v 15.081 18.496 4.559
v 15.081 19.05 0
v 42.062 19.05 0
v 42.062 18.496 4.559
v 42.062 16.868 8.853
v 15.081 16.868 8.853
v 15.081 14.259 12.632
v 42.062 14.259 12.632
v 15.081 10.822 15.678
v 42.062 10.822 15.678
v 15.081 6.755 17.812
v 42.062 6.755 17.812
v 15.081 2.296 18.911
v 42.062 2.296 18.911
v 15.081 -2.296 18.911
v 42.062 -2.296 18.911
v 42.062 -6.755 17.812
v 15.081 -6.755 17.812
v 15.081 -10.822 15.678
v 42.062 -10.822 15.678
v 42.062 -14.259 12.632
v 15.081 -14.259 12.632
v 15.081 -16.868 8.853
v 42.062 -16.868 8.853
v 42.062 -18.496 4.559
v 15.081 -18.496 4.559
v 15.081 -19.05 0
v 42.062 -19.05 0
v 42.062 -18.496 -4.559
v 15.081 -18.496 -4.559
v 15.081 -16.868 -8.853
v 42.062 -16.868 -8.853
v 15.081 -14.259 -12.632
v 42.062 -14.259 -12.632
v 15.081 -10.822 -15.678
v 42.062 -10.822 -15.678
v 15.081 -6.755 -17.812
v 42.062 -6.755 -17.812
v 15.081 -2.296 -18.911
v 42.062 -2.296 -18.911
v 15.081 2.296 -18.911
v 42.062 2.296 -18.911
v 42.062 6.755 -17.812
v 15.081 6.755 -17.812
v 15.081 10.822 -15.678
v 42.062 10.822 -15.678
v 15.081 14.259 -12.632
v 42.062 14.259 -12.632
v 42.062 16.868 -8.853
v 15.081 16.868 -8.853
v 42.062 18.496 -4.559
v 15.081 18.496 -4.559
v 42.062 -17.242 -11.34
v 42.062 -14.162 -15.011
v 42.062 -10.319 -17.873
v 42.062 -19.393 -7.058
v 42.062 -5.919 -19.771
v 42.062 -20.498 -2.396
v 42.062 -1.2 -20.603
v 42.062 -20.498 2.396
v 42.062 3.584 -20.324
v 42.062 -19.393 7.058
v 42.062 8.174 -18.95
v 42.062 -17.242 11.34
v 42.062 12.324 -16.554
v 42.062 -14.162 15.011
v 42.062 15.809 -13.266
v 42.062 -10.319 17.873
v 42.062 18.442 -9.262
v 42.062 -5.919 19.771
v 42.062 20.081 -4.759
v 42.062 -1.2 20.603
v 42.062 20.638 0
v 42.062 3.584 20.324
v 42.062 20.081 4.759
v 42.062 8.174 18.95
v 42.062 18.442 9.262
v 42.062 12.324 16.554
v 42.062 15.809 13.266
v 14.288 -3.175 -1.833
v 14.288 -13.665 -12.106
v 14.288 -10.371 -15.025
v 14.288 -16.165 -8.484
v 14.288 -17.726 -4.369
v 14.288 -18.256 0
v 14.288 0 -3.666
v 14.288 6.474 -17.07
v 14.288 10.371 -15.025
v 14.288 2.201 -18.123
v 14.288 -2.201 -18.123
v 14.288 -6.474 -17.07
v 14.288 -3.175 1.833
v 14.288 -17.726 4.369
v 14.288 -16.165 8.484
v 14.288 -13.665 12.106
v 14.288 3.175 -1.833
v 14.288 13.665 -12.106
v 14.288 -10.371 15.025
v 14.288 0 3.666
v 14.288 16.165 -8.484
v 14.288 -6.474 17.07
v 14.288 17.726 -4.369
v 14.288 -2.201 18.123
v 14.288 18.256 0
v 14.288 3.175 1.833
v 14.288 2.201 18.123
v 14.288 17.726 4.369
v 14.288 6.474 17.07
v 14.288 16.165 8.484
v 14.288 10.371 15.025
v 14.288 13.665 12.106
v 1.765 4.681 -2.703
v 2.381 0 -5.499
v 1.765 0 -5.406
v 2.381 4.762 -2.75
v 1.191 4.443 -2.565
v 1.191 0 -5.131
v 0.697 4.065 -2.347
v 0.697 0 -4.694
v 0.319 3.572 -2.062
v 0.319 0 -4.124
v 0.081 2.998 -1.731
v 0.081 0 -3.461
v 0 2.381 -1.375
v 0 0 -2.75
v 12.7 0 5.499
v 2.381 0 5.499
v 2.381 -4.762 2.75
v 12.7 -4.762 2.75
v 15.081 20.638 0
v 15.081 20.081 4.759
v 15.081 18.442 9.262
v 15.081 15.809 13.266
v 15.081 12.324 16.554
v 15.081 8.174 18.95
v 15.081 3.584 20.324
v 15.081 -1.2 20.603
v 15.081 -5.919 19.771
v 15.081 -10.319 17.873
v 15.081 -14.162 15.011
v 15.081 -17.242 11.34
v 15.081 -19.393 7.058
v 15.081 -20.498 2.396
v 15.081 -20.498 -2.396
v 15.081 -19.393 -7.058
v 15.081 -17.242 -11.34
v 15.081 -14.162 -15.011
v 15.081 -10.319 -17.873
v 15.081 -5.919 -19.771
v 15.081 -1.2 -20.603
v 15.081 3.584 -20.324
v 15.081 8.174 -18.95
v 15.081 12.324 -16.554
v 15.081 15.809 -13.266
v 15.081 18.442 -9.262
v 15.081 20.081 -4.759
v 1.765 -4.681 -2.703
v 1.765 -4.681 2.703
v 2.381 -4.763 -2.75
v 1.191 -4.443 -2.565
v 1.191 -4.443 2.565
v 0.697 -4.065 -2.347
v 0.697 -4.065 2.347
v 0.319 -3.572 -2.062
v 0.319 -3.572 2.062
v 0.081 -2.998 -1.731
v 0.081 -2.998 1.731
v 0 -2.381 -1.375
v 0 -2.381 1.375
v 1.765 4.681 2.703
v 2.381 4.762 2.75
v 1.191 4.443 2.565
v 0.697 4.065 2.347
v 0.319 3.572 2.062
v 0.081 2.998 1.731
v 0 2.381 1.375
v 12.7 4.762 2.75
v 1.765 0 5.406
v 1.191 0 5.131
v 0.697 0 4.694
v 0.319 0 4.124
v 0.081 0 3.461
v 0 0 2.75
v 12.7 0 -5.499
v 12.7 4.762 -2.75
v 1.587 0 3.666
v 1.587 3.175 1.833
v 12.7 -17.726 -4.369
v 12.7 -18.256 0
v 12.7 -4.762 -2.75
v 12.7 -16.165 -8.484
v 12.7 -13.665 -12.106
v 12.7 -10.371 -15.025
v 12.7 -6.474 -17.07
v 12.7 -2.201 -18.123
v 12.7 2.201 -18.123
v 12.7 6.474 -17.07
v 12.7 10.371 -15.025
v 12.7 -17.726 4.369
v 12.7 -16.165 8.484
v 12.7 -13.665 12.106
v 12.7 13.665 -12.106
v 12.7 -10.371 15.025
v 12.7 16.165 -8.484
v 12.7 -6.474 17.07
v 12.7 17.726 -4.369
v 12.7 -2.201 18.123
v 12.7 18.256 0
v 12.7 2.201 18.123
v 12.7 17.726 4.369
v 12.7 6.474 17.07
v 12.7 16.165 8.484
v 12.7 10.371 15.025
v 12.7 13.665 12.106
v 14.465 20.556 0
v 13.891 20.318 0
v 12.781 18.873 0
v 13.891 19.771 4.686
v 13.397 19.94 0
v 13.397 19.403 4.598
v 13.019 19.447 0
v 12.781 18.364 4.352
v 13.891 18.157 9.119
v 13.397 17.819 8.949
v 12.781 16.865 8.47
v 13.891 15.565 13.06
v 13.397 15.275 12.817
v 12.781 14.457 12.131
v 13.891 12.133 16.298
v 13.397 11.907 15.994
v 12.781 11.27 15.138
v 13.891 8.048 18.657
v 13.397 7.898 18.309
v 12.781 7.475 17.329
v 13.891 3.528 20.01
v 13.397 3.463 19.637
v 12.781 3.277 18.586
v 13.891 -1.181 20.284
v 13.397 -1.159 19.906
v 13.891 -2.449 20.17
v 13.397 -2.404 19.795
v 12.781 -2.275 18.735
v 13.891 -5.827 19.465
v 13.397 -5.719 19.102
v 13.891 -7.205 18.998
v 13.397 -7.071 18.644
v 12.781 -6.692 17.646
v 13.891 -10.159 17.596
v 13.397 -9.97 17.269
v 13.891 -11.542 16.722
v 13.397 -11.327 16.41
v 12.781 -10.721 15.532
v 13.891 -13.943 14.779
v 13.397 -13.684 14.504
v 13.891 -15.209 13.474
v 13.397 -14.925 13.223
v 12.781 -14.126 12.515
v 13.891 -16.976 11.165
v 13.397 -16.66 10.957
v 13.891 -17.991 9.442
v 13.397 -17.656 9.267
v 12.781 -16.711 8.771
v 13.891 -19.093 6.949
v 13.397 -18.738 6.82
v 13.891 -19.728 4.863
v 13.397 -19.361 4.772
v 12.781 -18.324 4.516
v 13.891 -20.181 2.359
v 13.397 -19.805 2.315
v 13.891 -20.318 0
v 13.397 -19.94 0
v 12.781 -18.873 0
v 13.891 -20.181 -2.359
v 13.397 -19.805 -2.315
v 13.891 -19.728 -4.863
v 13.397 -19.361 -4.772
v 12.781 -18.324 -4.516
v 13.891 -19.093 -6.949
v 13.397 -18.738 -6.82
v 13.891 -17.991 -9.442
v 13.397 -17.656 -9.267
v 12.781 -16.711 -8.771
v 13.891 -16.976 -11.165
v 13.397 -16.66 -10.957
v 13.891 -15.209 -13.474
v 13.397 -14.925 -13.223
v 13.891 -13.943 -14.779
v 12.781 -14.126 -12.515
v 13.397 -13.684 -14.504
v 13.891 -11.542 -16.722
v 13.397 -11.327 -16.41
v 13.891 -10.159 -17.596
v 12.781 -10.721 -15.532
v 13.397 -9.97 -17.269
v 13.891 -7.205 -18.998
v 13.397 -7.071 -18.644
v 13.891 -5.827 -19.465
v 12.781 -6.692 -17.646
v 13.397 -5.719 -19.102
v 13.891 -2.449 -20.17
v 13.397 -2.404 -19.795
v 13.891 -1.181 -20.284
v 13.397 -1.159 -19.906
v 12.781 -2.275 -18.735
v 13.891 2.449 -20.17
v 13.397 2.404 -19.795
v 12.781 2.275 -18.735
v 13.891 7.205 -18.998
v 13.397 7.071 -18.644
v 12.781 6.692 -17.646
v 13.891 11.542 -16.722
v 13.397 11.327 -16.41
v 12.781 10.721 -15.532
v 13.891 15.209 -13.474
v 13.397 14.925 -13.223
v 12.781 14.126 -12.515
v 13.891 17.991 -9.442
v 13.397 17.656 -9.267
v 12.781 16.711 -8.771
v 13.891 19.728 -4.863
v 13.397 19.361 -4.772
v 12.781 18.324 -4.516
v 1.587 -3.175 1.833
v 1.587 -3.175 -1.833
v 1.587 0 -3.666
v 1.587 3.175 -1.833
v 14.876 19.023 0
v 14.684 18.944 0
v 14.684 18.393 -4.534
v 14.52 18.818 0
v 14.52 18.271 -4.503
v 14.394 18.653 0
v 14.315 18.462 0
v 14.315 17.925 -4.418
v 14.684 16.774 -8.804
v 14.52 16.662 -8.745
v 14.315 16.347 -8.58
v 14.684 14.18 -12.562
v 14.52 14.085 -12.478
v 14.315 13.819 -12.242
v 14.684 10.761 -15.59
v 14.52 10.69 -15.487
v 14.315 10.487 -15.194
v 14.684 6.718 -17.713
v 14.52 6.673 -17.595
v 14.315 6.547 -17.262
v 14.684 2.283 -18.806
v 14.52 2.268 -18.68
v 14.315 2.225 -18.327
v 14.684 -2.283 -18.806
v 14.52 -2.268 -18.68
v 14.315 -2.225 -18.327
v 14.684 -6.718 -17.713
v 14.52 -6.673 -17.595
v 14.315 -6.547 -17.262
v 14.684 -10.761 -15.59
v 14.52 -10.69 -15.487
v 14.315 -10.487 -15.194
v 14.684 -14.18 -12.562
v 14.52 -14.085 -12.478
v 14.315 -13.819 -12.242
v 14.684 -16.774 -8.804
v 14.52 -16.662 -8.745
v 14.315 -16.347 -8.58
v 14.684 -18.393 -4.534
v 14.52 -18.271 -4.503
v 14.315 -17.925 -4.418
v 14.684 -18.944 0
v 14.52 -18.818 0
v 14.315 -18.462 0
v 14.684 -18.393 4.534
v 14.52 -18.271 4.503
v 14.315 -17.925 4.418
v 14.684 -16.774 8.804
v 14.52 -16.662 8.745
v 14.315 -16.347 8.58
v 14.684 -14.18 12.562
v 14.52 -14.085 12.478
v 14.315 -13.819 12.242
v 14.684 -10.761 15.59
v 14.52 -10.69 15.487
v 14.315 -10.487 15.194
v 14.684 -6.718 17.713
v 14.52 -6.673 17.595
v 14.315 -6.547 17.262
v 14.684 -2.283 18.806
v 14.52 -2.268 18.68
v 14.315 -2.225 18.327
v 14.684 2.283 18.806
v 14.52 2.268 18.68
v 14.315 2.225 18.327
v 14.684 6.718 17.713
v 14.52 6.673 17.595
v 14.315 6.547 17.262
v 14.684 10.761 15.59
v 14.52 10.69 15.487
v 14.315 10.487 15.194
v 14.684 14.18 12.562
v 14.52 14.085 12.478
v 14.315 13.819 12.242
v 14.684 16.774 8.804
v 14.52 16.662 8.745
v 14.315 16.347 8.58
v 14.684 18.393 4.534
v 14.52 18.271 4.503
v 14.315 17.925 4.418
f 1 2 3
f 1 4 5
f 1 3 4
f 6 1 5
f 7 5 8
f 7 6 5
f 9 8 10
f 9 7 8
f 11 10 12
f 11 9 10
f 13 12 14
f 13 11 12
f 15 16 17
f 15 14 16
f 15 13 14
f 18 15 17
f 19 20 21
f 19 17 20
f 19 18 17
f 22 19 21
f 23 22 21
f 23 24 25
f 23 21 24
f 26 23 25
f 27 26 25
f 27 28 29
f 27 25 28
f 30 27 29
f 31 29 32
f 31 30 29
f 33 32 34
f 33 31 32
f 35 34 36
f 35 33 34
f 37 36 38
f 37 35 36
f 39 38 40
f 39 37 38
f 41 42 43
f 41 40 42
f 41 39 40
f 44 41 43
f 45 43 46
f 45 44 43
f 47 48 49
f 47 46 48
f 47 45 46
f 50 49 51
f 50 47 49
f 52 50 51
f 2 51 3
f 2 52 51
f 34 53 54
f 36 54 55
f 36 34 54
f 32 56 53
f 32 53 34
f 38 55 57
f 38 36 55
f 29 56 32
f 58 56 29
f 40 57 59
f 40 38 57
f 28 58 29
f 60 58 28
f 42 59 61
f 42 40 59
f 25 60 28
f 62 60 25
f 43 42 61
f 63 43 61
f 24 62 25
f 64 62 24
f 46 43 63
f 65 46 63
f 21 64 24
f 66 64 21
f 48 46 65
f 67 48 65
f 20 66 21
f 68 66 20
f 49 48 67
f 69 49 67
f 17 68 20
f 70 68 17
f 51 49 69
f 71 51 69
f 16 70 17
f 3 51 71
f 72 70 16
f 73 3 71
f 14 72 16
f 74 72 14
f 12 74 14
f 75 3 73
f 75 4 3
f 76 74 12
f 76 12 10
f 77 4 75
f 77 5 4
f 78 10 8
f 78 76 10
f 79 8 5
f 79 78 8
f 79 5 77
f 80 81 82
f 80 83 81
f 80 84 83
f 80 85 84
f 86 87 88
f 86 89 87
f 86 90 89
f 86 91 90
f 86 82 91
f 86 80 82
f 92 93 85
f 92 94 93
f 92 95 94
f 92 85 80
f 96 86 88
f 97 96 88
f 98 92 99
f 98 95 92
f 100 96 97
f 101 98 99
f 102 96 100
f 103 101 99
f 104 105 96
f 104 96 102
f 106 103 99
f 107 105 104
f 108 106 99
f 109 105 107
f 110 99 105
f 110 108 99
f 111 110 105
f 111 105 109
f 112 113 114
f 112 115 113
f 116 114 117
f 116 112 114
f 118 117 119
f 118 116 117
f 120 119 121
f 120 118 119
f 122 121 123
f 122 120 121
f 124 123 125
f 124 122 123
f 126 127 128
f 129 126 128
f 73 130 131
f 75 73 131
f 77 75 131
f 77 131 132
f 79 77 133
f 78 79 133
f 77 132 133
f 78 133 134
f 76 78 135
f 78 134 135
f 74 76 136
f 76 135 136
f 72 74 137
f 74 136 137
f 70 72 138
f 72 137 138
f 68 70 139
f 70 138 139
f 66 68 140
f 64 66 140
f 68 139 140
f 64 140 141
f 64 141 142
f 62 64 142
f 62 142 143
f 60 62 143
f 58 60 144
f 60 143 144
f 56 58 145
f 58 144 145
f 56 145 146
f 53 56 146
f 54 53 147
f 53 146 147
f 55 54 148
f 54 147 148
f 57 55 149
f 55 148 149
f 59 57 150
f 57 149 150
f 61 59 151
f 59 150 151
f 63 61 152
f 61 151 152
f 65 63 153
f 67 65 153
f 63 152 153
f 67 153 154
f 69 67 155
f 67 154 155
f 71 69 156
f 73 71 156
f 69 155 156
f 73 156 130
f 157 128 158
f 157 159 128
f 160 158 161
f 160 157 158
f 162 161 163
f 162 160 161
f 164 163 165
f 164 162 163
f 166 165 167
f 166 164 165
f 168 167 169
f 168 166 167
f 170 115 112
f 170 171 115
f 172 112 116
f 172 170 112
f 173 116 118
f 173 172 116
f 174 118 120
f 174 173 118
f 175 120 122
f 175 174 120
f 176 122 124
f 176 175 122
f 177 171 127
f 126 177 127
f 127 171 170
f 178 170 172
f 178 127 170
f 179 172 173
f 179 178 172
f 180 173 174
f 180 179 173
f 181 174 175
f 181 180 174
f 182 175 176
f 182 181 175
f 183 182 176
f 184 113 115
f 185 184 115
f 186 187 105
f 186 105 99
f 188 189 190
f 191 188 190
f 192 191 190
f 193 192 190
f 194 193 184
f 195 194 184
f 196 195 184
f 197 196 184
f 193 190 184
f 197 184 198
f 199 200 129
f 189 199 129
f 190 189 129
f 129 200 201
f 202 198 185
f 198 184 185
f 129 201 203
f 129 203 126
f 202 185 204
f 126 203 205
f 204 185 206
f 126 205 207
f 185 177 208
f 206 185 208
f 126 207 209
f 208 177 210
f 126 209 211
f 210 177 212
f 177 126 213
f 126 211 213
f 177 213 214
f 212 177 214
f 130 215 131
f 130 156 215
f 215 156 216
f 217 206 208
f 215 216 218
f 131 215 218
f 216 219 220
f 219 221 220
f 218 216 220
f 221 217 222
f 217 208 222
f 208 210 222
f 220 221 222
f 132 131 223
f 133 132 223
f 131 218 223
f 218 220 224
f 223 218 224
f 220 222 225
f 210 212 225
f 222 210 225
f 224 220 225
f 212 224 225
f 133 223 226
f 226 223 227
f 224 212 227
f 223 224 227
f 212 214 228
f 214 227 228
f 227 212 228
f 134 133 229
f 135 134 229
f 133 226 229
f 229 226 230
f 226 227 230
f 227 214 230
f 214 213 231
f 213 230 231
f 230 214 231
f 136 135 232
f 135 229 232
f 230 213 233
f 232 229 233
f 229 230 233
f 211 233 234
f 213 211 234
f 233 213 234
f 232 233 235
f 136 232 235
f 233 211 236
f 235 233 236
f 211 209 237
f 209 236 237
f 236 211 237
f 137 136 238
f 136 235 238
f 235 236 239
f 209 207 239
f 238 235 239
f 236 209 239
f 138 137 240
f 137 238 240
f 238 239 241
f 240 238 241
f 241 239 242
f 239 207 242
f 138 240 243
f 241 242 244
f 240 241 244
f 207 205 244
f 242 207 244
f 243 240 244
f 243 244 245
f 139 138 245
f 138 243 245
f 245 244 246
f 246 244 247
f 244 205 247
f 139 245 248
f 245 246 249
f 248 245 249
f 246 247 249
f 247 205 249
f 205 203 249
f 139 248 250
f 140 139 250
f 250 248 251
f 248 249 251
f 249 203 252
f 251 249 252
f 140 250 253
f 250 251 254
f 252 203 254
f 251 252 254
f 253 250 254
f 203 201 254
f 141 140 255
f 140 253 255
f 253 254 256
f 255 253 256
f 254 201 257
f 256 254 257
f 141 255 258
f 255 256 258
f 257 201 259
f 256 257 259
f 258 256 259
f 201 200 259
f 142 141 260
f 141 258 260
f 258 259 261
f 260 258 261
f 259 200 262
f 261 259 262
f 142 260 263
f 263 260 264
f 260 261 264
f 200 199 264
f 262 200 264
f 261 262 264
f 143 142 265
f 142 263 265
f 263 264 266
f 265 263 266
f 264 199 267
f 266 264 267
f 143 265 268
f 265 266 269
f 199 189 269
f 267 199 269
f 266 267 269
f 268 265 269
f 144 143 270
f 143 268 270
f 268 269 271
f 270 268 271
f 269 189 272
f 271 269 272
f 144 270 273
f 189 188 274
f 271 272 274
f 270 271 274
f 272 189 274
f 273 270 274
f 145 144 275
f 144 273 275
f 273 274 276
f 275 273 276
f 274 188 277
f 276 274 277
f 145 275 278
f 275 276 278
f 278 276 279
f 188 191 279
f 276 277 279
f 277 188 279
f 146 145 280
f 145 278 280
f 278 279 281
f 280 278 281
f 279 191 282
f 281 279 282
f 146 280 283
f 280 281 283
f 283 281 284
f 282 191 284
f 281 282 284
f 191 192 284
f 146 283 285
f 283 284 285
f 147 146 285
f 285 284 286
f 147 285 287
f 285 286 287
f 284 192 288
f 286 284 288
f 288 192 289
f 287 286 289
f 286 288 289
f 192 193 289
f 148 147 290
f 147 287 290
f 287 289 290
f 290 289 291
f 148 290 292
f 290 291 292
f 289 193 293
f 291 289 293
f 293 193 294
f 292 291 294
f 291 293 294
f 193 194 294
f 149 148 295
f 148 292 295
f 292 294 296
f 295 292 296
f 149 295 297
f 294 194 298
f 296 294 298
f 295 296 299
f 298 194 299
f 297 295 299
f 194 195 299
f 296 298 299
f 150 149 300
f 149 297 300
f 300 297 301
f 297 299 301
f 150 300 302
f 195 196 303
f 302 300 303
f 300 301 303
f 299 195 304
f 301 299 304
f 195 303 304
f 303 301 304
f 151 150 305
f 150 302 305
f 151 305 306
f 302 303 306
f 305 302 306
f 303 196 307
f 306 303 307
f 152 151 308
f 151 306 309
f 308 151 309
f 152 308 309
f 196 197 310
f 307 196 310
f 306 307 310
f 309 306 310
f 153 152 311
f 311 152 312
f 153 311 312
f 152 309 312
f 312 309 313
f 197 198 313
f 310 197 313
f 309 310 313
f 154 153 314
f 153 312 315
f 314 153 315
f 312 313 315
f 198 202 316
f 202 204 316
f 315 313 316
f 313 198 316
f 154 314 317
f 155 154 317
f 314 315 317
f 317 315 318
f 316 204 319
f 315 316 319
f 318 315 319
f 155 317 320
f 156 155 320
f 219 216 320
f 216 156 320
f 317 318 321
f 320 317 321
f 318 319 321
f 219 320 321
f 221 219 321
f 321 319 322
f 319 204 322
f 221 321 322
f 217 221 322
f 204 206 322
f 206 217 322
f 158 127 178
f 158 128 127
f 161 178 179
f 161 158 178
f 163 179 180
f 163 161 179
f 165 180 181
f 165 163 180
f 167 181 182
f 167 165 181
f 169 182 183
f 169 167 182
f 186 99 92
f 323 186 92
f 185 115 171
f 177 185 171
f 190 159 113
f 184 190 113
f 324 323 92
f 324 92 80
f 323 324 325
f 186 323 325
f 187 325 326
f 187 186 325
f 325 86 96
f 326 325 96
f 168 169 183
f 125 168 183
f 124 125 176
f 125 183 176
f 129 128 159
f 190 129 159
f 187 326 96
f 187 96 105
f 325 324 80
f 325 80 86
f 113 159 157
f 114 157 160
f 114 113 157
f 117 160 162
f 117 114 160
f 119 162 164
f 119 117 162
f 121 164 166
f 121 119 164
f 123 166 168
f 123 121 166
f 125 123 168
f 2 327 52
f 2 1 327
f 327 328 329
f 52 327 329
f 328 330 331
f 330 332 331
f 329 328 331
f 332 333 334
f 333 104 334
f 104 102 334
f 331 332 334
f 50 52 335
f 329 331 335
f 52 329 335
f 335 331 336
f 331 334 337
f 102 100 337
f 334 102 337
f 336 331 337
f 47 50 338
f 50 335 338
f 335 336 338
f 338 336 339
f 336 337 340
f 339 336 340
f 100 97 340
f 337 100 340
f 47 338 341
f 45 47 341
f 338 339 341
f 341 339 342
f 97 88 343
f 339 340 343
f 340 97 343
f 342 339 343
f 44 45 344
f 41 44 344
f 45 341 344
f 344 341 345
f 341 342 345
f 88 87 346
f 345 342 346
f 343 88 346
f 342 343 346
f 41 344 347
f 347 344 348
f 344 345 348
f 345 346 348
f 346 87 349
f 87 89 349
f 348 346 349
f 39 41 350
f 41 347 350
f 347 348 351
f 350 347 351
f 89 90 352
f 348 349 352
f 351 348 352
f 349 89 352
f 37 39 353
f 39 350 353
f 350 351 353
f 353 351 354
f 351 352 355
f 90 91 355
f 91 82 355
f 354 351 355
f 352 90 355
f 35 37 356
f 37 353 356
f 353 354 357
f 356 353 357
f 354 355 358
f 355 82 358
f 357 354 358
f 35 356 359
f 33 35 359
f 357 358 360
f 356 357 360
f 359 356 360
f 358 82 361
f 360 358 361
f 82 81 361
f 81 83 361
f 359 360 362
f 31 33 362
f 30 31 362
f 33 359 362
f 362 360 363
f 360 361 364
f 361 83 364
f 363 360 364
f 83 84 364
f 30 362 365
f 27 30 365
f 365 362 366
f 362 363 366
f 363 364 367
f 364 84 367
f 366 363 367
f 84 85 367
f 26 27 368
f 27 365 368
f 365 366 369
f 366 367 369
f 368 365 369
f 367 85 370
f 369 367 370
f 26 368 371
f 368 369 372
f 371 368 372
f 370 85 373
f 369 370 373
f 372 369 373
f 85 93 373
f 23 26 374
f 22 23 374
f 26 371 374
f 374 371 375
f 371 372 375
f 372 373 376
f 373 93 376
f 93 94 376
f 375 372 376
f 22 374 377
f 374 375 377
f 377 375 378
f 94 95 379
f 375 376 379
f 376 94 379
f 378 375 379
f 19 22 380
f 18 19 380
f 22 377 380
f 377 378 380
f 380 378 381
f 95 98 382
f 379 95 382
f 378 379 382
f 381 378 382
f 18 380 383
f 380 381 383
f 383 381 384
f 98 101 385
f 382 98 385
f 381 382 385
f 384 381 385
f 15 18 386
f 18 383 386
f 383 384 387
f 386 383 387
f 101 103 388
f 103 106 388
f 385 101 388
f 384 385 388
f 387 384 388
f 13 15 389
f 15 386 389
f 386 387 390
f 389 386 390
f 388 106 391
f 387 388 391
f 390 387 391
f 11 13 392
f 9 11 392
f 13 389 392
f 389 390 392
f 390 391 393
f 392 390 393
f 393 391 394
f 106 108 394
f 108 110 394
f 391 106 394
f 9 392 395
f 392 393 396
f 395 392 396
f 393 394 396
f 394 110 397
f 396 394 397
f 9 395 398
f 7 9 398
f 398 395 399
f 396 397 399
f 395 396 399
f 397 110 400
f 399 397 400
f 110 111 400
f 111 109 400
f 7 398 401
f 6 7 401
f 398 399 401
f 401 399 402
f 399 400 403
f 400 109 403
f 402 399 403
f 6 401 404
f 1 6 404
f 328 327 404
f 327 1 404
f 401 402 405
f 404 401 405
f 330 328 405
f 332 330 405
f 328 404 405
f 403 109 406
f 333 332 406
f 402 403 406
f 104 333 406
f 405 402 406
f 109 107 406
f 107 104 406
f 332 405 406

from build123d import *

# Parameters (mm, degrees)
F1_DEPTH = 12.7
F2_R     = 20.6375
F3_DEPTH = 29.3624
F4_T     = -1.5875
F5_R     = 0.79375
F6_R     = 2.38125
F7_R     = 2.38125


with BuildPart() as f1:
    # F0 (on Right) → F1 (new body)
    with BuildSketch(Plane.YZ):
        Polygon((4.7625, -2.749630657), (4.7625, 2.749630657), (0, 5.499261314), (-4.7625, 2.749630657), (-4.7625, -2.749630657), (0, -5.499261314), align=None)
    extrude(amount=F1_DEPTH)

    # F2 (on face) → F3 (join)
    with BuildSketch(Plane.YZ.offset(12.7)):
        Circle(F2_R)
    extrude(amount=F3_DEPTH)

    # F4
    f4_openings = [f1.faces().sort_by_distance(p)[0] for p in [
        (42.0624, 0, 0),
    ]]
    offset(amount=F4_T, openings=f4_openings, kind=Kind.INTERSECTION)

    # F5
    f5_edges = [f1.edges().sort_by_distance(p)[0] for p in [
        (14.2875, -19.05, 0),
    ]]
    fillet(f5_edges, radius=F5_R)

    # F6
    f6_edges = [f1.edges().sort_by_distance(p)[0] for p in [
        (12.7, -20.6375, 0),
    ]]
    fillet(f6_edges, radius=F6_R)

    # F7
    f7_edges = [f1.edges().sort_by_distance(p)[0] for p in [
        (0, 2.38125, 4.124446),
        (0, -2.38125, 4.124446),
        (0, -4.7625, 0),
        (0, -2.38125, -4.124446),
        (0, 2.38125, -4.124446),
        (0, 4.7625, 0),
    ]]
    fillet(f7_edges, radius=F7_R)


solid = f1.part
